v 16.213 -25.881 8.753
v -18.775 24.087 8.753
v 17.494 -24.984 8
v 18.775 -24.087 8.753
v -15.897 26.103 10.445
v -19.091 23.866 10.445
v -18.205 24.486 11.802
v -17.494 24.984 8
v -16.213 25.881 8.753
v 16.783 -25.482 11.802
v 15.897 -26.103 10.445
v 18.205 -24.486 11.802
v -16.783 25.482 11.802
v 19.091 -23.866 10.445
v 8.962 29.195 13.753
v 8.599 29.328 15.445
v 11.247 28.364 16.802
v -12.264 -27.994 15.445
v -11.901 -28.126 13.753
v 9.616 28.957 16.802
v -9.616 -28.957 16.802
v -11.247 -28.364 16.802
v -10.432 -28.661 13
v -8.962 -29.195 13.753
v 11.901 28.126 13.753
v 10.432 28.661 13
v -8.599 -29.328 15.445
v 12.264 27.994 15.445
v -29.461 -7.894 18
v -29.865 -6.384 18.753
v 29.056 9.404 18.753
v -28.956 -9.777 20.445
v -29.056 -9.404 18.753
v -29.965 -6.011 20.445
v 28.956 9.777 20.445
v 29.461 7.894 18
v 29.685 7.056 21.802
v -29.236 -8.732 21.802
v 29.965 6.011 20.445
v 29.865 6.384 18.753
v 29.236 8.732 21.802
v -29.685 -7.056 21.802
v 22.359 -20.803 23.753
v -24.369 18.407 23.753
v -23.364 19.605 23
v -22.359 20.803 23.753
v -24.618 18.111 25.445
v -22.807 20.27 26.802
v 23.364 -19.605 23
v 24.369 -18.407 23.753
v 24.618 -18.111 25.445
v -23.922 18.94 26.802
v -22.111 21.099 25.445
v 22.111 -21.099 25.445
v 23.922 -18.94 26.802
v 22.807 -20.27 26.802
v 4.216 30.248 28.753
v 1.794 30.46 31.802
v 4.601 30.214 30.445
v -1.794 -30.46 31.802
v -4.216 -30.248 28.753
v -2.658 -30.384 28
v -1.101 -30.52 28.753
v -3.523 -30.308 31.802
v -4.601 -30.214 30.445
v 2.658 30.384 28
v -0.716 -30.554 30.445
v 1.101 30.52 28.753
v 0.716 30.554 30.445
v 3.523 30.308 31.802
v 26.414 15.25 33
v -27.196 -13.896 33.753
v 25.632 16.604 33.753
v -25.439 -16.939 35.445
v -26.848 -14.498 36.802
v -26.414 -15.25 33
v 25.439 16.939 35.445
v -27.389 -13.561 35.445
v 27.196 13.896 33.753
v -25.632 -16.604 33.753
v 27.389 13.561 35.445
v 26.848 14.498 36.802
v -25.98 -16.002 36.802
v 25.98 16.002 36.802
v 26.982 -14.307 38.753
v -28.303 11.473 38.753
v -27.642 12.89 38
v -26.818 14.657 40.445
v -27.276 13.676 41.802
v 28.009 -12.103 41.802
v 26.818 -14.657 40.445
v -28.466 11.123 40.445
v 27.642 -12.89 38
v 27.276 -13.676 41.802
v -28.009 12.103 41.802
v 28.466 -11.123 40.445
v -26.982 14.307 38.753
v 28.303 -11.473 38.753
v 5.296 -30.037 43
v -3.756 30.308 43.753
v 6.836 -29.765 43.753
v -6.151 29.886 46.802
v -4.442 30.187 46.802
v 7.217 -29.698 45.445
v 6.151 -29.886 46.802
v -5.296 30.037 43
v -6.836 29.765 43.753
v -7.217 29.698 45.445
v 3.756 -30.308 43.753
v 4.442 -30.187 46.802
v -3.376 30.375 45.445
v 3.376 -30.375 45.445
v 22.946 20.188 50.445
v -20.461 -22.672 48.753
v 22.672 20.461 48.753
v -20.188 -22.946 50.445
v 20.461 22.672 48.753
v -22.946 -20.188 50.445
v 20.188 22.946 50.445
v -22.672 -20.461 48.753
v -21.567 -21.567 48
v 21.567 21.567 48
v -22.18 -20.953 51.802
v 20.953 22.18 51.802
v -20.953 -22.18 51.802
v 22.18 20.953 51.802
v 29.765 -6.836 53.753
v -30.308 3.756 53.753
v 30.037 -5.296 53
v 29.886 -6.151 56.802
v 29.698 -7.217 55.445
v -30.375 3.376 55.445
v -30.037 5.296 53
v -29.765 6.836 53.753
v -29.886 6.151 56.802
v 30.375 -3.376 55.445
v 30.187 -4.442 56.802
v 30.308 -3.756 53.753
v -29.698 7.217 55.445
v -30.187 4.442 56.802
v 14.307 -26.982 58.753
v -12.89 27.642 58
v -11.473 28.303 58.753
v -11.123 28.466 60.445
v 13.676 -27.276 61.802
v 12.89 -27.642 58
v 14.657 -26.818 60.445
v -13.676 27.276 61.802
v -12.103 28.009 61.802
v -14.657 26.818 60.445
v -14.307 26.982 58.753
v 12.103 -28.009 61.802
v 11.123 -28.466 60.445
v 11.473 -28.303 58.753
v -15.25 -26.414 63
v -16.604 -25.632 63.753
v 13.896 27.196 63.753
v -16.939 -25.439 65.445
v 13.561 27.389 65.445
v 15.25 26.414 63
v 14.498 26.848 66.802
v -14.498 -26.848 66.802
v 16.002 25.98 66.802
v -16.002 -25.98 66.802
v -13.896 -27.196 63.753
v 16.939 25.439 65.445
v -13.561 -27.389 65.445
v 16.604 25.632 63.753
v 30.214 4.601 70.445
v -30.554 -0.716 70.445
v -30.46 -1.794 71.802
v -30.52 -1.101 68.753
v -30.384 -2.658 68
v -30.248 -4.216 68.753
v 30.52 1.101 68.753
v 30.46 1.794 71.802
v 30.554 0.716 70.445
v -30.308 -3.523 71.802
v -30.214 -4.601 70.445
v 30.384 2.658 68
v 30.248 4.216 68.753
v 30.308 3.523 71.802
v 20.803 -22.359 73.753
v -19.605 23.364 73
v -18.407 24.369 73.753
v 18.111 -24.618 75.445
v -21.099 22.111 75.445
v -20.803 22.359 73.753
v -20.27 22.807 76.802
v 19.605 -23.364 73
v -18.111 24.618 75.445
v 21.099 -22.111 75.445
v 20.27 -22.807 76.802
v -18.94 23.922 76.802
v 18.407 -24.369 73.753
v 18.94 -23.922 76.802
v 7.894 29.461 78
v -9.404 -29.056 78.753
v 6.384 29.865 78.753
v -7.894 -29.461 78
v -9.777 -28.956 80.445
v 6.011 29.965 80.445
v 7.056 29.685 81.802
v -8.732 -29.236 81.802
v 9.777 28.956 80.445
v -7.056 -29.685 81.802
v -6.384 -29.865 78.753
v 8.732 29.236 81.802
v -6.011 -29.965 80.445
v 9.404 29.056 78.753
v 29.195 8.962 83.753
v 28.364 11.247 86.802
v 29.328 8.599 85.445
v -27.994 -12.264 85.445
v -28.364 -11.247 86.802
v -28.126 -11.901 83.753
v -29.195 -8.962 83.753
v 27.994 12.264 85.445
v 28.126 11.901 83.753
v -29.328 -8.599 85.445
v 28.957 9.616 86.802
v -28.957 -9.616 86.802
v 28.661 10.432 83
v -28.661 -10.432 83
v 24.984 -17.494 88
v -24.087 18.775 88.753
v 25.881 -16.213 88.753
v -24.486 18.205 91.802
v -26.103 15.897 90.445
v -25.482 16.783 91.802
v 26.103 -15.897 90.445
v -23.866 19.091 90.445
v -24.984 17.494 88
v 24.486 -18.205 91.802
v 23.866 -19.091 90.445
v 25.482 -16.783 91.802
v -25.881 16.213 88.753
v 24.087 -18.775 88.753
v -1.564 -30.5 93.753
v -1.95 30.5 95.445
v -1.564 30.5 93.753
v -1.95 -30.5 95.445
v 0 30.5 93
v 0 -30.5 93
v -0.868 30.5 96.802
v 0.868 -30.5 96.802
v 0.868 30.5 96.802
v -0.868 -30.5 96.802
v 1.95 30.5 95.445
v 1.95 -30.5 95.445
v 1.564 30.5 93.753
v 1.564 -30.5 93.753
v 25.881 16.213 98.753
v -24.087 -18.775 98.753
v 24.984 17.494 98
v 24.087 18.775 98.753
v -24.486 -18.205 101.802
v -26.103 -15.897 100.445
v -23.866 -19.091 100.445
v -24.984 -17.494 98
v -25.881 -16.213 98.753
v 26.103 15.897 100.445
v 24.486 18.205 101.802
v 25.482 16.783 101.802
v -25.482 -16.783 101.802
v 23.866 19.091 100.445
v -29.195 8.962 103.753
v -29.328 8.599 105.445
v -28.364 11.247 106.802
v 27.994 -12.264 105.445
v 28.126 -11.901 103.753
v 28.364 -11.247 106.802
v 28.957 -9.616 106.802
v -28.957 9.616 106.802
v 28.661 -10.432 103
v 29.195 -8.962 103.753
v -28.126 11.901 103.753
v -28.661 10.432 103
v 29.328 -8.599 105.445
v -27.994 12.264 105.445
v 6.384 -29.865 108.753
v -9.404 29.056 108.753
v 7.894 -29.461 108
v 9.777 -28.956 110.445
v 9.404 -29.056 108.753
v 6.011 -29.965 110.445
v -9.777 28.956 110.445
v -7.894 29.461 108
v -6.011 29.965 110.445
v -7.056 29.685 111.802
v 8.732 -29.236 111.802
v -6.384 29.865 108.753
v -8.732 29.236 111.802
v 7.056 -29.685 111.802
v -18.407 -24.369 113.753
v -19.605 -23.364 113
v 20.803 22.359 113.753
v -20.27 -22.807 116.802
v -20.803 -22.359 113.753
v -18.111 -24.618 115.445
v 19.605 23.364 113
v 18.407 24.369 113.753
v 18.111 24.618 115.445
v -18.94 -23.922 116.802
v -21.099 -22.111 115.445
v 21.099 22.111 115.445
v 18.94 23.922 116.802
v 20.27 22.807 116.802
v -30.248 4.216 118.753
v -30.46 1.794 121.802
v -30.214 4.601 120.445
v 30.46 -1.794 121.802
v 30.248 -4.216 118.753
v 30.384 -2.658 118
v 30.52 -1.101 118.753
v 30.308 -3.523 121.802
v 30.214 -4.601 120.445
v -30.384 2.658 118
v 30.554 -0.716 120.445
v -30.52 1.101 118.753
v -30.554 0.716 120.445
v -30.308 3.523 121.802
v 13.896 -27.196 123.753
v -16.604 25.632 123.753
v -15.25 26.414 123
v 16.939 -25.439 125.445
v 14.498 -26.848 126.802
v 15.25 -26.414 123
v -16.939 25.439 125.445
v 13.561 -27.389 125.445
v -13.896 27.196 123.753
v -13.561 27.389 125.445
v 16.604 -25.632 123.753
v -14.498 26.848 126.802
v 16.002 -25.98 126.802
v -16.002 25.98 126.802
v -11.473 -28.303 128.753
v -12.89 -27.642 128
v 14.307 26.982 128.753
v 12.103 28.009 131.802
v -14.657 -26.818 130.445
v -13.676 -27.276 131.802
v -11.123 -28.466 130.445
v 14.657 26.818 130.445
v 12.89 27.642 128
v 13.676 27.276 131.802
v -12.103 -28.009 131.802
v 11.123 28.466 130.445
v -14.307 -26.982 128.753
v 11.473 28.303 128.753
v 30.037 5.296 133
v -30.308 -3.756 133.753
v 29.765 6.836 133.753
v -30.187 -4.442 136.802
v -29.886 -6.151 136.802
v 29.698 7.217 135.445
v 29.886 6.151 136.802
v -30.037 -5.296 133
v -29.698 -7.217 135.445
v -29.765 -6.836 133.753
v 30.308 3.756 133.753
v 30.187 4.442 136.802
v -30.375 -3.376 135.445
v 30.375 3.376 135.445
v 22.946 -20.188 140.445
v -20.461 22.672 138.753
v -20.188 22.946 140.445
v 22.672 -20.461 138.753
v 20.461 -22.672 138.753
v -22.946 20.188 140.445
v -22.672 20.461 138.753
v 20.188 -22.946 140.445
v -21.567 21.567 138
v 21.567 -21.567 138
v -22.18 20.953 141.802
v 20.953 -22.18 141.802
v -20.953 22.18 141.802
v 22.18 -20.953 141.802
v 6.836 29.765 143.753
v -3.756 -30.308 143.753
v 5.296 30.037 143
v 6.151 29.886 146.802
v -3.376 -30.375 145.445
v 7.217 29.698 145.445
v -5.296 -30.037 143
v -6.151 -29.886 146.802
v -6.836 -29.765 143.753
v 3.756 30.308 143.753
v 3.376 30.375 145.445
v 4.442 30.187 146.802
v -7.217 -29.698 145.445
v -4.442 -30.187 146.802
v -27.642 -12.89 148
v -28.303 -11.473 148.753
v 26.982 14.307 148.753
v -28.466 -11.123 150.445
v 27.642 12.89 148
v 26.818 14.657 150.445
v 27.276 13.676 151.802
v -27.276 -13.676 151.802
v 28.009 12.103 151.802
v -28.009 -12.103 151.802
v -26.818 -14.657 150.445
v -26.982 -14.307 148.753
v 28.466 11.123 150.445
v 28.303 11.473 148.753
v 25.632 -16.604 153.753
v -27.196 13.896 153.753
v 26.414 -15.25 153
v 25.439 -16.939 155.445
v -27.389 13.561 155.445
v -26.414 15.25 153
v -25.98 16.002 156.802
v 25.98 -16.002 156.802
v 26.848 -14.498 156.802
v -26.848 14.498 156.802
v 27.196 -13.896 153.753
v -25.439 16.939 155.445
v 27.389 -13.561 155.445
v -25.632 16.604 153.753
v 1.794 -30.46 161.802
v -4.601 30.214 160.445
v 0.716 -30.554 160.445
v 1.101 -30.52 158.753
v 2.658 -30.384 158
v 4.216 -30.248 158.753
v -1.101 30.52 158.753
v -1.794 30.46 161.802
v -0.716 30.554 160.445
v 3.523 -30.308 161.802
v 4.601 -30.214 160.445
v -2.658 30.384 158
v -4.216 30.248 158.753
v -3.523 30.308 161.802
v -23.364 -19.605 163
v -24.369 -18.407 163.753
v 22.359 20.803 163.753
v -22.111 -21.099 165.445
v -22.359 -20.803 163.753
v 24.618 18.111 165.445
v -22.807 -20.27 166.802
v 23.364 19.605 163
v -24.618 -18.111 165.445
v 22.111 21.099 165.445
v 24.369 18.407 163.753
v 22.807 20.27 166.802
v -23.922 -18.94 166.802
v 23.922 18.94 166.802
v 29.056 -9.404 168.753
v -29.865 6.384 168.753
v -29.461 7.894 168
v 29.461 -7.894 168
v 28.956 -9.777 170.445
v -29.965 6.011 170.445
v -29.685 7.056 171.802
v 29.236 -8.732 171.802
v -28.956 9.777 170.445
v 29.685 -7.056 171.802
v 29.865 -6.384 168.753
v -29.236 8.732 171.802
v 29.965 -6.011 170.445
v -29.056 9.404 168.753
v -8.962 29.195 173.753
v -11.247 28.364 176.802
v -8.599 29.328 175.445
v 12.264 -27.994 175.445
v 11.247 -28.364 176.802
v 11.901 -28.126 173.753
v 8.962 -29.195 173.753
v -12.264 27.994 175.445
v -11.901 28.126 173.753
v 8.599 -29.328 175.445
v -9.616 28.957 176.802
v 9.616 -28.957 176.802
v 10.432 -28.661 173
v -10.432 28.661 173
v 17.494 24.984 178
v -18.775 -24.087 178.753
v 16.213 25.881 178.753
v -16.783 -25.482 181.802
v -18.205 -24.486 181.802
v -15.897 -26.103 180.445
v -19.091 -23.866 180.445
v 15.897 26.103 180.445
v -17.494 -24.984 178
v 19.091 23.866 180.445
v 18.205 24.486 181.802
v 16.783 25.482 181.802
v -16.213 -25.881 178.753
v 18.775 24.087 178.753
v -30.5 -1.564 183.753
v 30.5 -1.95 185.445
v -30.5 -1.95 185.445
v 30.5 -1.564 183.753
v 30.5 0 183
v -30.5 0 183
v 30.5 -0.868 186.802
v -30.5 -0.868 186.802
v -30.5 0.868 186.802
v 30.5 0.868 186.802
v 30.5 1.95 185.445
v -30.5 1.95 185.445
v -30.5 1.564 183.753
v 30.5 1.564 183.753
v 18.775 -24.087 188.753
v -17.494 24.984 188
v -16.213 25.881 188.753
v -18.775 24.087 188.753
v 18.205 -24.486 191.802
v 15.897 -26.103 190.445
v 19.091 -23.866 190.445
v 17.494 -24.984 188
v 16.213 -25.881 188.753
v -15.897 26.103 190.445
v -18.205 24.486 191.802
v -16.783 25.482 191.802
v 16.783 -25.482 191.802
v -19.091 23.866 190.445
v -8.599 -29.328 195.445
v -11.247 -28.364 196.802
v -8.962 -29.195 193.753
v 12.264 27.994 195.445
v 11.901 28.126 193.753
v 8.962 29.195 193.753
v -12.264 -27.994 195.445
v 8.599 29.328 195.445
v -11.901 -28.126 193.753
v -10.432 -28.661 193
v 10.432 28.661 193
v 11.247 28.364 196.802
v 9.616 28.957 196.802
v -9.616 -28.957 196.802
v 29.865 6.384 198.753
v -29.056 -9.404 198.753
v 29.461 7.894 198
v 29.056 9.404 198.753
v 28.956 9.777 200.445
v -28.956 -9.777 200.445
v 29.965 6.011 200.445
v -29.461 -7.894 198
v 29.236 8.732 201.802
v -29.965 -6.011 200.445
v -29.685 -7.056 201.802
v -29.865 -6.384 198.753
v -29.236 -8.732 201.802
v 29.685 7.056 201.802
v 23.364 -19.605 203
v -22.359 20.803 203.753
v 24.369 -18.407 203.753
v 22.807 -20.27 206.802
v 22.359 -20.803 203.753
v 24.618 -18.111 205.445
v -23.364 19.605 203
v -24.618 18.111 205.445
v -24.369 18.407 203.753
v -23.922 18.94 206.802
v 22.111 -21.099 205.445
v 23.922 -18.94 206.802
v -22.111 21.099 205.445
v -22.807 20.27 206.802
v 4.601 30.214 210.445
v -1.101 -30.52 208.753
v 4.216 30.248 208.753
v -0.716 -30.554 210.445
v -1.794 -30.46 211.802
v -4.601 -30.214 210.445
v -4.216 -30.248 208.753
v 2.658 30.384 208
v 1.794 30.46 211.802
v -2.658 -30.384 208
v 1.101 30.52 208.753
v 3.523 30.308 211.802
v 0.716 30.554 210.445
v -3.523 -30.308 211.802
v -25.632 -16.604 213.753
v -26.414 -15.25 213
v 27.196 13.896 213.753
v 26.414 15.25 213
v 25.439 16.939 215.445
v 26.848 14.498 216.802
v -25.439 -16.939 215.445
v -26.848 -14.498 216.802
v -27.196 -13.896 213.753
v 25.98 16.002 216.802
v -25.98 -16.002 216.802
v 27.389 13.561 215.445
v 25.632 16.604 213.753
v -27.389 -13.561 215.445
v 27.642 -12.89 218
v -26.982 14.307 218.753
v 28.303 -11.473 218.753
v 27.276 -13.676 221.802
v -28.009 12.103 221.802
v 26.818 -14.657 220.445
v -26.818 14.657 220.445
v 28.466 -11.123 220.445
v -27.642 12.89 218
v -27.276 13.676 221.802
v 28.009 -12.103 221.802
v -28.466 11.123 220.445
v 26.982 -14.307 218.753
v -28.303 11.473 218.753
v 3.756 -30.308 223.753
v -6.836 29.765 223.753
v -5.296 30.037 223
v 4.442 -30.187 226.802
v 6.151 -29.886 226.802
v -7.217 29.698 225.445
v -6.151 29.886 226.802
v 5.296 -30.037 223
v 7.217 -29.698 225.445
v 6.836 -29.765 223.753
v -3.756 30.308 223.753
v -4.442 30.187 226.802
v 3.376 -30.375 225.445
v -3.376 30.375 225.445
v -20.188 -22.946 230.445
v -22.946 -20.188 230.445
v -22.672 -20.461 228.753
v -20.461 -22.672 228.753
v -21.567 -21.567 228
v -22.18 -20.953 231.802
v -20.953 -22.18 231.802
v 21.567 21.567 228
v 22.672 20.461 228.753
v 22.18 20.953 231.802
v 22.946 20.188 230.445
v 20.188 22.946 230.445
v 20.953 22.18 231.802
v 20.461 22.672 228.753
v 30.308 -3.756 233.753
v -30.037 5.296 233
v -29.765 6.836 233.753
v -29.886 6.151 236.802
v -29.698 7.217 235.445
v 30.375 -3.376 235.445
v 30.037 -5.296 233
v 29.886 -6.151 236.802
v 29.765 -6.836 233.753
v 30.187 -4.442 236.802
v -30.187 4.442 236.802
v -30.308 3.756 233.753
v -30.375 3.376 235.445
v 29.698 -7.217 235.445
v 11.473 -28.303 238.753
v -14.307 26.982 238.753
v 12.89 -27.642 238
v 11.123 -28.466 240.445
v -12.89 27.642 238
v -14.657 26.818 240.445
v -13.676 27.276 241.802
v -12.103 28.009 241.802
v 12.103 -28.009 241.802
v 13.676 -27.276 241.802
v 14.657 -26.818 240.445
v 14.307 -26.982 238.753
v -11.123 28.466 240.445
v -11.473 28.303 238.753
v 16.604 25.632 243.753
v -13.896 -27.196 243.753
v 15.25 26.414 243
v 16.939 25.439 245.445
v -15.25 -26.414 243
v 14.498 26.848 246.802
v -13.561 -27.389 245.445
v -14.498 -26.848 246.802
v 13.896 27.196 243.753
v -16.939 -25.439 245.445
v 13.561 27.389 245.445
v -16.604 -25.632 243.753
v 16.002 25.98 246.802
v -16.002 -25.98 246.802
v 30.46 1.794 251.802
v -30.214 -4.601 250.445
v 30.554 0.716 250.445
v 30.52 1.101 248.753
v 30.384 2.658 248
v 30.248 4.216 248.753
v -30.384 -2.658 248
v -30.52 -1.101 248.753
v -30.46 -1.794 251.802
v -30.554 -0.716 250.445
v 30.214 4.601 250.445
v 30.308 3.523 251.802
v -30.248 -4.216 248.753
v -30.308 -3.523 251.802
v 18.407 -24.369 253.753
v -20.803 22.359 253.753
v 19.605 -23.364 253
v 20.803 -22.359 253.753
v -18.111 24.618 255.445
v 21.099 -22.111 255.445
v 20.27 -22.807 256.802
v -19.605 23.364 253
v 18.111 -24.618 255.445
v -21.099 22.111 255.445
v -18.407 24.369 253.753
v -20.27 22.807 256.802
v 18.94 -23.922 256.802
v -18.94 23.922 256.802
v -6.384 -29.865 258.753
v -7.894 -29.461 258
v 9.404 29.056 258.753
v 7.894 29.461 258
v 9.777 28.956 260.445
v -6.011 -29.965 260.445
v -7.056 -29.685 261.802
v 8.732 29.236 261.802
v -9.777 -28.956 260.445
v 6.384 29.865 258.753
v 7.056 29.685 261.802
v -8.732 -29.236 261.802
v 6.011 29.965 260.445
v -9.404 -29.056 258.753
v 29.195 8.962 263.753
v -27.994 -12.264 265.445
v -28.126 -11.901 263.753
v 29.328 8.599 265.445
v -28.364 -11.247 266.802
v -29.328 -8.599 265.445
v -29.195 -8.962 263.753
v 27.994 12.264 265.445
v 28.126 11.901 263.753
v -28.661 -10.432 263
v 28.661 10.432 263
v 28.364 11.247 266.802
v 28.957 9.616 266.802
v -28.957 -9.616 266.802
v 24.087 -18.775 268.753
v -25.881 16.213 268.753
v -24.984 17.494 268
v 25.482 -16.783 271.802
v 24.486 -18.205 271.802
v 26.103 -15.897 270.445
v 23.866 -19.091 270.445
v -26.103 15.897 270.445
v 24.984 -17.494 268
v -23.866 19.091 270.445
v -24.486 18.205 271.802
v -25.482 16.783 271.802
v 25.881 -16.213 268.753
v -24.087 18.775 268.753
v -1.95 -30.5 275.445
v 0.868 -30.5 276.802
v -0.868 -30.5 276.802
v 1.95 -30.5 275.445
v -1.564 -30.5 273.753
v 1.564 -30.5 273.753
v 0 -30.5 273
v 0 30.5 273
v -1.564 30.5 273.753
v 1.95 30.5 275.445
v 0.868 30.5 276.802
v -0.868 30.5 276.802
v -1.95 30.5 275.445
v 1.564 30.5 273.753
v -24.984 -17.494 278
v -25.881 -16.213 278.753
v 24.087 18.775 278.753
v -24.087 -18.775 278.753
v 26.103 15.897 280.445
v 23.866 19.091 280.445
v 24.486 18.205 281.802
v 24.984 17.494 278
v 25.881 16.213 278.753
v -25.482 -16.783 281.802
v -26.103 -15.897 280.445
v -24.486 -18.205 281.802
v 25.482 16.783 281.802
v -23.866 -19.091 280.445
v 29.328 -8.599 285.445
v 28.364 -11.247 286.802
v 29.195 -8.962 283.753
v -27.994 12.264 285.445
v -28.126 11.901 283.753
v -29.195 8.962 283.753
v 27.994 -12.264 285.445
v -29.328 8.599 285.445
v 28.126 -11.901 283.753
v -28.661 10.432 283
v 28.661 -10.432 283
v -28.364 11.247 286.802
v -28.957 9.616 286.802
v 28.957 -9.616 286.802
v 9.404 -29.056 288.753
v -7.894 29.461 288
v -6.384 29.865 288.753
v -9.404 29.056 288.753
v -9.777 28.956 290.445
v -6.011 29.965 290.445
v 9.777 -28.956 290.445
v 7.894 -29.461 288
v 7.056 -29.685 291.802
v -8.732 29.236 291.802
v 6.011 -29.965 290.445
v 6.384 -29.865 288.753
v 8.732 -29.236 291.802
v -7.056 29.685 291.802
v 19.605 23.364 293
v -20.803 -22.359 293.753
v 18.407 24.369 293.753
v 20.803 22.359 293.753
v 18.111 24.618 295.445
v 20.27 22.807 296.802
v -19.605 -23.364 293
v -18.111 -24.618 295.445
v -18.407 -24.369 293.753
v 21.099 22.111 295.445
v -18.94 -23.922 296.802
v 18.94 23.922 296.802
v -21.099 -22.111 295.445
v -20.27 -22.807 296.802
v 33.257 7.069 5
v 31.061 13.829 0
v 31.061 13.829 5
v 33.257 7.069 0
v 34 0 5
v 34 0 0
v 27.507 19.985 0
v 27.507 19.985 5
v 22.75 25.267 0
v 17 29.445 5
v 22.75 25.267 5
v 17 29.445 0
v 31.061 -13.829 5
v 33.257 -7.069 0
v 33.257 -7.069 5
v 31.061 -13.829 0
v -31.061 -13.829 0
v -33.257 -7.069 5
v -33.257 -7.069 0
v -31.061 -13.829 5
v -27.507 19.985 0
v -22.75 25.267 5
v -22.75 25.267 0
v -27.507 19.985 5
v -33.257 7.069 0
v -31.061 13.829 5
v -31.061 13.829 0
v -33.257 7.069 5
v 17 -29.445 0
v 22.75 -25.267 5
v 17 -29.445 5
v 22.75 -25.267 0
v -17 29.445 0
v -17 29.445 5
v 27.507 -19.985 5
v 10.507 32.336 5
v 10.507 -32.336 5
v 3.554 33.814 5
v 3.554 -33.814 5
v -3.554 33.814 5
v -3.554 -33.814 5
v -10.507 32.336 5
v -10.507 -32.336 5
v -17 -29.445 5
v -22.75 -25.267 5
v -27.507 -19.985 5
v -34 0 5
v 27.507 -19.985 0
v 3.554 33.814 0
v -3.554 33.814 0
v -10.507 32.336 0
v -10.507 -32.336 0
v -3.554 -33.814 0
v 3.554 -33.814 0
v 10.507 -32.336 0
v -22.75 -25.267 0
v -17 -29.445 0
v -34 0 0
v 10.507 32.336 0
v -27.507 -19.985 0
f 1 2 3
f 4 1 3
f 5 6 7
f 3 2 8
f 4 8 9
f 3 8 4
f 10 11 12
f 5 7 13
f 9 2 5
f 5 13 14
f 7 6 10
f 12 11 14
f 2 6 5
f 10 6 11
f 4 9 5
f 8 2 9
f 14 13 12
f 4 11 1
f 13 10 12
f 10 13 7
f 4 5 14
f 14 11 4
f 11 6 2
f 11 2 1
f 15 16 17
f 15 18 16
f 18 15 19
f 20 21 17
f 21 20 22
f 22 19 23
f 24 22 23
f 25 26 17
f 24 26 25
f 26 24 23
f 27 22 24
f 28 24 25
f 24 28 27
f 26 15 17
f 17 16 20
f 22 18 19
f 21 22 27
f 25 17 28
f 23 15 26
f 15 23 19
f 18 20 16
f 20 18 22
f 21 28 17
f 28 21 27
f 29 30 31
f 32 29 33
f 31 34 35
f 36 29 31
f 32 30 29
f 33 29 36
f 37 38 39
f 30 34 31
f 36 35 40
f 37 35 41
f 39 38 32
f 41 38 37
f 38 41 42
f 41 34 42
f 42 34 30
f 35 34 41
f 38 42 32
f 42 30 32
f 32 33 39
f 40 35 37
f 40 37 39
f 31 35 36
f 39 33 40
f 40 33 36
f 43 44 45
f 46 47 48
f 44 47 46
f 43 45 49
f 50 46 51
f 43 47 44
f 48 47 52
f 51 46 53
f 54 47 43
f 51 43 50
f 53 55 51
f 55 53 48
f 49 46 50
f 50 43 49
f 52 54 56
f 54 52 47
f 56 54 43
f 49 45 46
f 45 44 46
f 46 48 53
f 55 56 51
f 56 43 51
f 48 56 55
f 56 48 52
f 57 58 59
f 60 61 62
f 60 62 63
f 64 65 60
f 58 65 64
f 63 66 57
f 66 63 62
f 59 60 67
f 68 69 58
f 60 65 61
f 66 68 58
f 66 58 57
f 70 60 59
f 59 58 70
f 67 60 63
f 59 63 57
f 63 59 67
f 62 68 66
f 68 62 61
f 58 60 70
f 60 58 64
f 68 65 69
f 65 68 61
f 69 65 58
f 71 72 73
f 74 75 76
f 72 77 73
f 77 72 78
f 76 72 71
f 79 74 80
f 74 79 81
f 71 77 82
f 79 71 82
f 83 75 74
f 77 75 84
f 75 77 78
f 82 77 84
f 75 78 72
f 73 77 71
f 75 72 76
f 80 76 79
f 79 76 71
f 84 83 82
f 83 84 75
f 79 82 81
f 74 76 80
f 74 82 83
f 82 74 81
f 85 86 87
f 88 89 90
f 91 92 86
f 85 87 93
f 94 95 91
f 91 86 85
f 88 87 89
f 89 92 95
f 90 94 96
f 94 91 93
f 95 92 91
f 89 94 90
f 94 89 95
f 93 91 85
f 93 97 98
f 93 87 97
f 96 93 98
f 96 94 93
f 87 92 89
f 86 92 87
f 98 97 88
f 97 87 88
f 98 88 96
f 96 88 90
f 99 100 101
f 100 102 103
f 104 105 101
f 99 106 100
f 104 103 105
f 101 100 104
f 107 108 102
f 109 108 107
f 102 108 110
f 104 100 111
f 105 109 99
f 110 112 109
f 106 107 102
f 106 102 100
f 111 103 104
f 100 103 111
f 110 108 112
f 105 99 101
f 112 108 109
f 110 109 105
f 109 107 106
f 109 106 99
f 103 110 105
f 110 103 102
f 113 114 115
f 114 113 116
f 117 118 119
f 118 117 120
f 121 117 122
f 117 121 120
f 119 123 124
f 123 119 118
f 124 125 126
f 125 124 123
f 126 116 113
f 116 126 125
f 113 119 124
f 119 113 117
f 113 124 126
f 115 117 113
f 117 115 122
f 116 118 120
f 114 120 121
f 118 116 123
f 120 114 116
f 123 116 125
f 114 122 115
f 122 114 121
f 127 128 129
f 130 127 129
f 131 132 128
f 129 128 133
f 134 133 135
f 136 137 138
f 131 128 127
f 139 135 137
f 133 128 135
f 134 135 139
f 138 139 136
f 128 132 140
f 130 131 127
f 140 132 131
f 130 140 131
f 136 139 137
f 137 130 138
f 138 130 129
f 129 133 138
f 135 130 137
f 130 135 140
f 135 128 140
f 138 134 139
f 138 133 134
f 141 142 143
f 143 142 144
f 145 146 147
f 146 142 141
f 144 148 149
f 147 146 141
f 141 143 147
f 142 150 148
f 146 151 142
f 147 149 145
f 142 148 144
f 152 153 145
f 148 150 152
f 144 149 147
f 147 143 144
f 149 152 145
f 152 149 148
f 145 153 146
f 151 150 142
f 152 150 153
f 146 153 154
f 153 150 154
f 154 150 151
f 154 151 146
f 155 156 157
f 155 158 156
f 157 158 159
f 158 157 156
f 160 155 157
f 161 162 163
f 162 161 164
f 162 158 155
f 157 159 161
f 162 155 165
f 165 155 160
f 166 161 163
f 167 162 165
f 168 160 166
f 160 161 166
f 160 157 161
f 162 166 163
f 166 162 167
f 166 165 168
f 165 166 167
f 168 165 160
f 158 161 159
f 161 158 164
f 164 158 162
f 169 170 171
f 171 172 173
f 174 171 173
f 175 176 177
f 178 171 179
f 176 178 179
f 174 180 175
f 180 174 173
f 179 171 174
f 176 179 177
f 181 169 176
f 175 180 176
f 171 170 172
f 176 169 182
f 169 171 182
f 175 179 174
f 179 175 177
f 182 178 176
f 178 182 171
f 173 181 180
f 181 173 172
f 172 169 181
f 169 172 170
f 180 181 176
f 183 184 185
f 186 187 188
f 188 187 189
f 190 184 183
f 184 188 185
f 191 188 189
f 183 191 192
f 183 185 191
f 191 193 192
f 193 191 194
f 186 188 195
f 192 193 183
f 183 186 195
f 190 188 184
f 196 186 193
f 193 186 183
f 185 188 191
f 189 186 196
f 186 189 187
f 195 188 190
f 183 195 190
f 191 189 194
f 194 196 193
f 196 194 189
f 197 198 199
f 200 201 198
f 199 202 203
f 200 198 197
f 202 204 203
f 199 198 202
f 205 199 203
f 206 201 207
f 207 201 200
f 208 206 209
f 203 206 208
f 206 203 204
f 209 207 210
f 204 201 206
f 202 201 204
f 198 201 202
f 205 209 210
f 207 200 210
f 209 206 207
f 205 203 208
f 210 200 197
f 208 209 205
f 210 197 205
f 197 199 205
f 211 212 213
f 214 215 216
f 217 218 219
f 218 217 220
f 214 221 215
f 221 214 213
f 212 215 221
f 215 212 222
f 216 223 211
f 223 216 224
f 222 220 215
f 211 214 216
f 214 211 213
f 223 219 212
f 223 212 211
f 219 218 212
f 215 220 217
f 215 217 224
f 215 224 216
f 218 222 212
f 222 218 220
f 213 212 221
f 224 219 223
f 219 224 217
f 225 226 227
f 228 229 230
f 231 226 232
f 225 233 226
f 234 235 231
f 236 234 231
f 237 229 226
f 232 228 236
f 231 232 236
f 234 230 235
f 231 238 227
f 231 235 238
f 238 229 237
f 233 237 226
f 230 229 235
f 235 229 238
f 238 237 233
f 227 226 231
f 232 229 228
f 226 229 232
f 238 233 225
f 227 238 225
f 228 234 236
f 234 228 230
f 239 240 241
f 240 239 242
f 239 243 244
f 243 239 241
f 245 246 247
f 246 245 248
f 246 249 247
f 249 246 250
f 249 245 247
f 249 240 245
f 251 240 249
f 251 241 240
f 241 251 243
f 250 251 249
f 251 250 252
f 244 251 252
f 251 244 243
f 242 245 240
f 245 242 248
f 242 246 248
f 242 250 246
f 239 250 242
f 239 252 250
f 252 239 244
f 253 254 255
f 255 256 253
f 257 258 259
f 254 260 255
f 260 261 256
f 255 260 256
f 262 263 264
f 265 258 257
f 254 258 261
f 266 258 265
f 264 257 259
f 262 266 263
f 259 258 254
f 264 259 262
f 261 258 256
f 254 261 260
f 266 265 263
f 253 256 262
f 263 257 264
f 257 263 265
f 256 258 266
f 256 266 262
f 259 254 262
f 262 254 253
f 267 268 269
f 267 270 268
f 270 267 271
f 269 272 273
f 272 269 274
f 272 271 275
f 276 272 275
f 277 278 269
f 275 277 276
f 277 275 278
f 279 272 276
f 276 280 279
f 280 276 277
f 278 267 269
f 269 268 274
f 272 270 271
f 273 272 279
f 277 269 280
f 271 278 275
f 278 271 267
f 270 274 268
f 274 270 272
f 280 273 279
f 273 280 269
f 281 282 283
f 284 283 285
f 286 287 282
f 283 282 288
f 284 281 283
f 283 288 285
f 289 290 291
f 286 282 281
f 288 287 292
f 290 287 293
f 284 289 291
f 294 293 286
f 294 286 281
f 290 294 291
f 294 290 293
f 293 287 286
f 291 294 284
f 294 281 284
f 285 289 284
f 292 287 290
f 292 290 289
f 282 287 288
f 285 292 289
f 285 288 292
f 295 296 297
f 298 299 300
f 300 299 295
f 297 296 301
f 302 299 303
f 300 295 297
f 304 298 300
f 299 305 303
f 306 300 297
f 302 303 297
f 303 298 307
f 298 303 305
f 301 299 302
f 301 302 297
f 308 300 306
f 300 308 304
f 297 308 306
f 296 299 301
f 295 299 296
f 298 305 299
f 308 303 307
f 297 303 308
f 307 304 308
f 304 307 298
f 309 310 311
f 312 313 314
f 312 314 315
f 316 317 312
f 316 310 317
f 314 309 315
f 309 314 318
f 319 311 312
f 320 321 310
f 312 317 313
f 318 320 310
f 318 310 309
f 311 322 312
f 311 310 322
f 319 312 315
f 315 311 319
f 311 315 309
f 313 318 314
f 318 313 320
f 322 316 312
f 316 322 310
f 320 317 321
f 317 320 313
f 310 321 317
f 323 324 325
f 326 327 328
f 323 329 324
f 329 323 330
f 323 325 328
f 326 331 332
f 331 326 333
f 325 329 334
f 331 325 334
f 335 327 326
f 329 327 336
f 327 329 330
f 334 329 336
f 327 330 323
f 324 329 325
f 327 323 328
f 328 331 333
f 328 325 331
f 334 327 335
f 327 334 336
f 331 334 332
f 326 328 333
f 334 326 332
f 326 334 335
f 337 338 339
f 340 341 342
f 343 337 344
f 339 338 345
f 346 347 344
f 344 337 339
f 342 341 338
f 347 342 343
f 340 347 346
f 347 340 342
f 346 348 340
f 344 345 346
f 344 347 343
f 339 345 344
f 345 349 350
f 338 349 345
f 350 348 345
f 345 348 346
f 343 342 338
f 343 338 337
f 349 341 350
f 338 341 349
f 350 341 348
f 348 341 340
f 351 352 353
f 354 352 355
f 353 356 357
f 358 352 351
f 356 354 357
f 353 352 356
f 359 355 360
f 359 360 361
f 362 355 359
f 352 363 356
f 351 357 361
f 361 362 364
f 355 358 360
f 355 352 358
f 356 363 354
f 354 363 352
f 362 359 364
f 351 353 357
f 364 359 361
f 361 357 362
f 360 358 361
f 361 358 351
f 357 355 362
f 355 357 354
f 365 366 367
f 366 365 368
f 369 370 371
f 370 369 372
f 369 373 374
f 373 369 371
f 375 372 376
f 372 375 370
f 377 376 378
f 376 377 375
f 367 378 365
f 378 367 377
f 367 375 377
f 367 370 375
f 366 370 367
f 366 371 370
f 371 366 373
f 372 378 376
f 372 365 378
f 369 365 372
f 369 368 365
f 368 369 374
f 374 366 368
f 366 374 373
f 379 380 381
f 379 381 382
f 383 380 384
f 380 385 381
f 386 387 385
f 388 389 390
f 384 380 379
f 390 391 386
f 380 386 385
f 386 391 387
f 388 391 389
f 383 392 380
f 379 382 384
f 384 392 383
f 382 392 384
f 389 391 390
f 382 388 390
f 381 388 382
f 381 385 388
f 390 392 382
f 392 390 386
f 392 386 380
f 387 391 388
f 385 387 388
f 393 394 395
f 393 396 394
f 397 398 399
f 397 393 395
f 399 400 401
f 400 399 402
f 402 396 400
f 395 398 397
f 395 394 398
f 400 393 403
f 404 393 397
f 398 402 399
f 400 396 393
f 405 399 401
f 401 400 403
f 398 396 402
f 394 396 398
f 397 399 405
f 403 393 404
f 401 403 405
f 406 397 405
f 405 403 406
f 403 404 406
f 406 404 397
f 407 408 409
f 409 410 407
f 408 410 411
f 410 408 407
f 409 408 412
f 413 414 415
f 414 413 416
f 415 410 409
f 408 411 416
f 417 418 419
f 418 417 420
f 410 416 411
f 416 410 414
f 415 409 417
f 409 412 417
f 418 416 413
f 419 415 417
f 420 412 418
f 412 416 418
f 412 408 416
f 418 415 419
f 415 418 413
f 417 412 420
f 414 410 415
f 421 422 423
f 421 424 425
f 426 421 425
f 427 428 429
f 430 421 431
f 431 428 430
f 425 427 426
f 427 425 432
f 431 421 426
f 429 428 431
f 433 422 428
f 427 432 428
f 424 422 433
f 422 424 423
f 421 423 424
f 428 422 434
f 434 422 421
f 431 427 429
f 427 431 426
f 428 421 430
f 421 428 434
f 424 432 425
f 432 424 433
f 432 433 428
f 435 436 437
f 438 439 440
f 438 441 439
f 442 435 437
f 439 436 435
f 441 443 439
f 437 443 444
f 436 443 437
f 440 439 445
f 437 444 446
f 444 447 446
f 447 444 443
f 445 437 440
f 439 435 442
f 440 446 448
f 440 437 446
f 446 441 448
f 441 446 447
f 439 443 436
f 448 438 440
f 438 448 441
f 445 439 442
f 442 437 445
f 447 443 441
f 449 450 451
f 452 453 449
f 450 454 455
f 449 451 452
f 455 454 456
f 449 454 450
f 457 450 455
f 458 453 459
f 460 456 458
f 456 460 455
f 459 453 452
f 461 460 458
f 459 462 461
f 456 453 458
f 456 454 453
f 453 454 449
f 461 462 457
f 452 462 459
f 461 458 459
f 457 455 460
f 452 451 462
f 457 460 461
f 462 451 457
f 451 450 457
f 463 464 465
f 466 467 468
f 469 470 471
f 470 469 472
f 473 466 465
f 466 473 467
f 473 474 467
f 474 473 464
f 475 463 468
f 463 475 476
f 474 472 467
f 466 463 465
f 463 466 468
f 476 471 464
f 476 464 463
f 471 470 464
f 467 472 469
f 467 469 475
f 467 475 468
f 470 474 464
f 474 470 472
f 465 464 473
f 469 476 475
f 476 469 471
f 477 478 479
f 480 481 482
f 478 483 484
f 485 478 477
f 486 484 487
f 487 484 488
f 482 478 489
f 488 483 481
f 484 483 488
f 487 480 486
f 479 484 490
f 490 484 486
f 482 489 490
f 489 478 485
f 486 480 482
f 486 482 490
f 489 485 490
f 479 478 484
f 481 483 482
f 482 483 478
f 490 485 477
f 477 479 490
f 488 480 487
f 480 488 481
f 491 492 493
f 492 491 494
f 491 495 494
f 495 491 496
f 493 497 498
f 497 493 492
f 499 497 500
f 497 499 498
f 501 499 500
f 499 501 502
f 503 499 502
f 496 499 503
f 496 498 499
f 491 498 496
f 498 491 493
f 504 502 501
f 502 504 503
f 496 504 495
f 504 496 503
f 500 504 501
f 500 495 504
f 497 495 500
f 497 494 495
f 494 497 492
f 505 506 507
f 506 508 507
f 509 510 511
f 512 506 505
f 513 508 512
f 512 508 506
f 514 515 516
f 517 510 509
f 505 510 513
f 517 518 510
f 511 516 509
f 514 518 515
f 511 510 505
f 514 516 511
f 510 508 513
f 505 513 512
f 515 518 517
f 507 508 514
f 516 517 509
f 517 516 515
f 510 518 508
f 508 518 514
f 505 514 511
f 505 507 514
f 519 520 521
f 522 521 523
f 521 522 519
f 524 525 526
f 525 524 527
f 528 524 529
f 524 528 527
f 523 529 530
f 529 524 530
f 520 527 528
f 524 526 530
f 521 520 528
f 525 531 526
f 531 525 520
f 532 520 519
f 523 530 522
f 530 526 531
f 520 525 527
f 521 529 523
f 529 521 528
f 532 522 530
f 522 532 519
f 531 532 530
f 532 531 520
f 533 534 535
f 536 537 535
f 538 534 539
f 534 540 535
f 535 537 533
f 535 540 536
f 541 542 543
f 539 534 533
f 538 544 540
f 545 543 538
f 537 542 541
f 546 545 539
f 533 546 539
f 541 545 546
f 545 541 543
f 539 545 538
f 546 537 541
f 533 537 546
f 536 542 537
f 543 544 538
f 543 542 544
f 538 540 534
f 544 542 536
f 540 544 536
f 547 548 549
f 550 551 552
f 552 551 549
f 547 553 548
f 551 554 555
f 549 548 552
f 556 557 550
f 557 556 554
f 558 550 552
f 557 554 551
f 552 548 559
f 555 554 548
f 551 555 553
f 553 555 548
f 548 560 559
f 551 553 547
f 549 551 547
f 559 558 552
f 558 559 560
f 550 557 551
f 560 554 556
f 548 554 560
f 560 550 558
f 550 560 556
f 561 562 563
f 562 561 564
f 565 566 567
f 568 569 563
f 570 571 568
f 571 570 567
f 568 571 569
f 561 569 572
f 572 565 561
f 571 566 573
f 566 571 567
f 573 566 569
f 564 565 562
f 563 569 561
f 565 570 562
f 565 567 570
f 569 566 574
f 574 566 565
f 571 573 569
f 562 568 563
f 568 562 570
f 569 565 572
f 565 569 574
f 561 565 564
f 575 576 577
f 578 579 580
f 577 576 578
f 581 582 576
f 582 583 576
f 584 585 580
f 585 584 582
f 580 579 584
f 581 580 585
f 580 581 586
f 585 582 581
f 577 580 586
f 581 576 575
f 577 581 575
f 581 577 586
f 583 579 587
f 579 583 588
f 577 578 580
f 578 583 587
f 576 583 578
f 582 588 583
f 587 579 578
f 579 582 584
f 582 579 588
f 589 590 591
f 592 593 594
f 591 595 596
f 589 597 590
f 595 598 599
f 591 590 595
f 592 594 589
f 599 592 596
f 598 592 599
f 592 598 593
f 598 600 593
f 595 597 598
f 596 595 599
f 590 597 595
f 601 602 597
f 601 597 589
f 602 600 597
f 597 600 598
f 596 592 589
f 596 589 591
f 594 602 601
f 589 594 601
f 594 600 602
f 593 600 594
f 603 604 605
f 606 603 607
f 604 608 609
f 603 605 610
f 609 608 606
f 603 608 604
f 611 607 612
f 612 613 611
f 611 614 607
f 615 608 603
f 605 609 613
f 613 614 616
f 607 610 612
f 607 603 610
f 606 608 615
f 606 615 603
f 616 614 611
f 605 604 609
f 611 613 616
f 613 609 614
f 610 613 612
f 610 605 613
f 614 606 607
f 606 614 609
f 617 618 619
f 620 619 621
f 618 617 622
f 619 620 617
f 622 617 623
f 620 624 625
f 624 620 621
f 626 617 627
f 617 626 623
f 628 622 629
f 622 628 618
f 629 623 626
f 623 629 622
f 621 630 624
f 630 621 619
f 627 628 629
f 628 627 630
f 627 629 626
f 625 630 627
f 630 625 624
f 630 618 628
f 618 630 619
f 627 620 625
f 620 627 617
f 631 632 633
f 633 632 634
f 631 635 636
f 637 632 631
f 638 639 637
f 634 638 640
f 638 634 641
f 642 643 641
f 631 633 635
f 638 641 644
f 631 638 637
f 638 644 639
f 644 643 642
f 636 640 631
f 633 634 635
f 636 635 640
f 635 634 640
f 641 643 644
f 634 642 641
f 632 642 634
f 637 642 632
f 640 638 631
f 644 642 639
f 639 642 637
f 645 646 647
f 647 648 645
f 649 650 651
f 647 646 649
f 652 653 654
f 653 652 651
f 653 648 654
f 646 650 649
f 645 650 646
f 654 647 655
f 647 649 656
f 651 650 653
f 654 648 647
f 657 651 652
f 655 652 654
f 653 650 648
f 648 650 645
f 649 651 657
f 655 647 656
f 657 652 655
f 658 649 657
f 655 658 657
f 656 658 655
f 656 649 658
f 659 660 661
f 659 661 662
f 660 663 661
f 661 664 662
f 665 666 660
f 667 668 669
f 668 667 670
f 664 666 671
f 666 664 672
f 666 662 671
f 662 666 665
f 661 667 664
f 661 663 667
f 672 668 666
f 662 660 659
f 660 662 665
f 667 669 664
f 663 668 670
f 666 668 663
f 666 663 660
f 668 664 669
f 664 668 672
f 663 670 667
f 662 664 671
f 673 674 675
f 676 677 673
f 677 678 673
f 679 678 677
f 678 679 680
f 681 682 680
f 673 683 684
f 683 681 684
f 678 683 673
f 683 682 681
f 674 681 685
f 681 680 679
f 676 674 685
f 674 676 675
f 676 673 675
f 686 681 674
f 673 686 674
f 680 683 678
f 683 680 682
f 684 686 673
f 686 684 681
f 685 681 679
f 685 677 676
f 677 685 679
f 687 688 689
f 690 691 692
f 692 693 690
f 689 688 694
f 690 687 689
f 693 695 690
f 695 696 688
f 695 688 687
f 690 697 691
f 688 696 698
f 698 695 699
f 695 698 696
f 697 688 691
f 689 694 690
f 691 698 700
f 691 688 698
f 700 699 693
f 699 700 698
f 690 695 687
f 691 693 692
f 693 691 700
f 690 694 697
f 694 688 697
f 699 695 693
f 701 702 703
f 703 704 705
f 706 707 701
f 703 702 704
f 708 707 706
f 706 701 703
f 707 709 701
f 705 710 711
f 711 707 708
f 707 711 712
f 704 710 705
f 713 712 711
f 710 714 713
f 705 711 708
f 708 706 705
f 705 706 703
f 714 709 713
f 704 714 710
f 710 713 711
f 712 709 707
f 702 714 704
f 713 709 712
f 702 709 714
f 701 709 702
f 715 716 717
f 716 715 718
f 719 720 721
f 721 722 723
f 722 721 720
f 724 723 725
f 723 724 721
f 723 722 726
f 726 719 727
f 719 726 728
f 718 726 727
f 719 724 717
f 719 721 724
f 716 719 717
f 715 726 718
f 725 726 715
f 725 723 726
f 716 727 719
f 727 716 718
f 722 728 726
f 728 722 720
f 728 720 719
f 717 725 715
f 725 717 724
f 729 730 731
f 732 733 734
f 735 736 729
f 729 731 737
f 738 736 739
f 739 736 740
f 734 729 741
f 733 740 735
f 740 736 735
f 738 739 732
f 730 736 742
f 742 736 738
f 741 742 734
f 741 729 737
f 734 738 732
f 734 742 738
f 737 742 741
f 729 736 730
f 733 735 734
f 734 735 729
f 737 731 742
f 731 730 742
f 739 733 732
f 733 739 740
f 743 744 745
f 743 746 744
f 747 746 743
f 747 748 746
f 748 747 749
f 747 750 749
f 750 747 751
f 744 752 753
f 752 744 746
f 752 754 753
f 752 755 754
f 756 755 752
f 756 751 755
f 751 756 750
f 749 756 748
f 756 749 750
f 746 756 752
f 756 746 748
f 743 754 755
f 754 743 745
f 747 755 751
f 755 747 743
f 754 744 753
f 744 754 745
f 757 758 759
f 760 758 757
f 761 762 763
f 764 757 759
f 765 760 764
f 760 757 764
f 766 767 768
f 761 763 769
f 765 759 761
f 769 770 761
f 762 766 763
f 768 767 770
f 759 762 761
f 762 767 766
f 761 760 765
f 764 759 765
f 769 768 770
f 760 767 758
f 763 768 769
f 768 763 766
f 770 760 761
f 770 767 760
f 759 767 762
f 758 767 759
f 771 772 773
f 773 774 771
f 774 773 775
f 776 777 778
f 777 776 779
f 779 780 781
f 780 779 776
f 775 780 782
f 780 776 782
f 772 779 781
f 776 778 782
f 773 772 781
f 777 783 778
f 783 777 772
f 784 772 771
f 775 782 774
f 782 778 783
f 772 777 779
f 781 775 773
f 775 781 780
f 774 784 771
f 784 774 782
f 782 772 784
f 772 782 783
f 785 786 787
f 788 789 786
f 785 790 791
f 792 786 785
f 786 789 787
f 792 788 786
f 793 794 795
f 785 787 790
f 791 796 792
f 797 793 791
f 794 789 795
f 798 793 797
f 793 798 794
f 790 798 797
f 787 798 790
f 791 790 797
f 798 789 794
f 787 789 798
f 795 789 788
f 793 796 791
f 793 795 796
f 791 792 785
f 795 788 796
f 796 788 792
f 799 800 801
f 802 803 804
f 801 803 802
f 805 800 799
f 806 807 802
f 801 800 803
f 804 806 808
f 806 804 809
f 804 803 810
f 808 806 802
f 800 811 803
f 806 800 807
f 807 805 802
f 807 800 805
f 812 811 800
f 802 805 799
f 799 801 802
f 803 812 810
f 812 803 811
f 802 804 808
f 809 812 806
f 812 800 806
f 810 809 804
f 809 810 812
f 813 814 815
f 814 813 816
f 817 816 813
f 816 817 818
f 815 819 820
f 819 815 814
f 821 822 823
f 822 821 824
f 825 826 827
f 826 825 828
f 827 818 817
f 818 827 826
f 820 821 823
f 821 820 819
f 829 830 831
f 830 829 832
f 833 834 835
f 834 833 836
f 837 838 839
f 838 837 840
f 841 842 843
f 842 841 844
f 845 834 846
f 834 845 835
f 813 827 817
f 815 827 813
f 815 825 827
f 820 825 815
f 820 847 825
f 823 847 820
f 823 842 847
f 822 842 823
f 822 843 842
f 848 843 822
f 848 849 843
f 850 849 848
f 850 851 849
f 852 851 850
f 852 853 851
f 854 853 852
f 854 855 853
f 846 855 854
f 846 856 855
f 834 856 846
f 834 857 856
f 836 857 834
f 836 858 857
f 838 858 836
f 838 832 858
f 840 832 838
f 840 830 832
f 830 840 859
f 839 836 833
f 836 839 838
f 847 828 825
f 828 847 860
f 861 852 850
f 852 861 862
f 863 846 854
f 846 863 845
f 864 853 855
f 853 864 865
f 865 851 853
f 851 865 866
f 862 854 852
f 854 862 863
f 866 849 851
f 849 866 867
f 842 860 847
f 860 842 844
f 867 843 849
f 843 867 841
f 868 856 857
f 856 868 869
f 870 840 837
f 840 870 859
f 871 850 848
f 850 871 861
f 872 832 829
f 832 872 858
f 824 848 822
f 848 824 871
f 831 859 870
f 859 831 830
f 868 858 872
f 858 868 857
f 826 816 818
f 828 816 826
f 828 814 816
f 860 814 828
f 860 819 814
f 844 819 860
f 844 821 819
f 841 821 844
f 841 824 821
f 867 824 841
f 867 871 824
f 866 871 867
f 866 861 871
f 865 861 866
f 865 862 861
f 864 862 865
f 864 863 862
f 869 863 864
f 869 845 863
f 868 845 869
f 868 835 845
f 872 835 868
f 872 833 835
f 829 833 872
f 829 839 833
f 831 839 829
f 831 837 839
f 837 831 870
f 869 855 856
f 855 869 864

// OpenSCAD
// file: ../../../shapes/open-cylinder/open-cylinder.scad
// // TODO: Lower this to 50.
module openCylinder(height = 3,
                    outerRadius = 7,
                    innerRadius = 4.5,
                    fn = 100)
{
echo("hi oc");    
    $fn = fn;

    difference()
    {
        cylinder(r=outerRadius,
                 h=height);

        translate([0, 0, -1])
        cylinder(r=innerRadius,
                 h=height+1.01);
    }
}
// file: ../rainmaker.scad
use <../../shapes/open-cylinder/open-cylinder.scad>

module rainmaker(height = 140,
                 innerRadius = 30,
                 outerRadius = 34,
			 	 stepRadius = 2)
{
    union()
    {
        // the main shell
    	%
        openCylinder(height = height,
                     innerRadius = innerRadius,
                     outerRadius = outerRadius);

        bottomZ = 5;

        // the steps
        zStart = bottomZ;
        step_xLength = (innerRadius * 2) + 1;
        rainmaker_steps(height = height,
						stepRadius = stepRadius,
						step_xLength = step_xLength,
                        zStart = zStart);

        // the bottom
        cylinder(r=outerRadius, h=bottomZ);
    }
}

module rainmaker_steps(height,
						stepRadius,
						step_xLength,
						zStart)
{
    step = 5;

	zEnd = height - step - stepRadius;

    for(z = [zStart : step : zEnd])
    {
		xTranslate = 0;
        zTranslate = zStart + z;

//		zRotate = z * 5;
		zRotate = z * 25;

		for(s = [1 : 1 : 2])
		{
			if(s == 1)
			{
//				color("green")
		        translate([xTranslate, 0, zTranslate])
				rotate([0, 90, zRotate])
		        cylinder(r = stepRadius,
							h = step_xLength,
							center = true);
			}
		}
    }
}
// main file
use <../rainmaker.scad>

rainmaker(height = 300,
		  rungsPerLevel = 2);
